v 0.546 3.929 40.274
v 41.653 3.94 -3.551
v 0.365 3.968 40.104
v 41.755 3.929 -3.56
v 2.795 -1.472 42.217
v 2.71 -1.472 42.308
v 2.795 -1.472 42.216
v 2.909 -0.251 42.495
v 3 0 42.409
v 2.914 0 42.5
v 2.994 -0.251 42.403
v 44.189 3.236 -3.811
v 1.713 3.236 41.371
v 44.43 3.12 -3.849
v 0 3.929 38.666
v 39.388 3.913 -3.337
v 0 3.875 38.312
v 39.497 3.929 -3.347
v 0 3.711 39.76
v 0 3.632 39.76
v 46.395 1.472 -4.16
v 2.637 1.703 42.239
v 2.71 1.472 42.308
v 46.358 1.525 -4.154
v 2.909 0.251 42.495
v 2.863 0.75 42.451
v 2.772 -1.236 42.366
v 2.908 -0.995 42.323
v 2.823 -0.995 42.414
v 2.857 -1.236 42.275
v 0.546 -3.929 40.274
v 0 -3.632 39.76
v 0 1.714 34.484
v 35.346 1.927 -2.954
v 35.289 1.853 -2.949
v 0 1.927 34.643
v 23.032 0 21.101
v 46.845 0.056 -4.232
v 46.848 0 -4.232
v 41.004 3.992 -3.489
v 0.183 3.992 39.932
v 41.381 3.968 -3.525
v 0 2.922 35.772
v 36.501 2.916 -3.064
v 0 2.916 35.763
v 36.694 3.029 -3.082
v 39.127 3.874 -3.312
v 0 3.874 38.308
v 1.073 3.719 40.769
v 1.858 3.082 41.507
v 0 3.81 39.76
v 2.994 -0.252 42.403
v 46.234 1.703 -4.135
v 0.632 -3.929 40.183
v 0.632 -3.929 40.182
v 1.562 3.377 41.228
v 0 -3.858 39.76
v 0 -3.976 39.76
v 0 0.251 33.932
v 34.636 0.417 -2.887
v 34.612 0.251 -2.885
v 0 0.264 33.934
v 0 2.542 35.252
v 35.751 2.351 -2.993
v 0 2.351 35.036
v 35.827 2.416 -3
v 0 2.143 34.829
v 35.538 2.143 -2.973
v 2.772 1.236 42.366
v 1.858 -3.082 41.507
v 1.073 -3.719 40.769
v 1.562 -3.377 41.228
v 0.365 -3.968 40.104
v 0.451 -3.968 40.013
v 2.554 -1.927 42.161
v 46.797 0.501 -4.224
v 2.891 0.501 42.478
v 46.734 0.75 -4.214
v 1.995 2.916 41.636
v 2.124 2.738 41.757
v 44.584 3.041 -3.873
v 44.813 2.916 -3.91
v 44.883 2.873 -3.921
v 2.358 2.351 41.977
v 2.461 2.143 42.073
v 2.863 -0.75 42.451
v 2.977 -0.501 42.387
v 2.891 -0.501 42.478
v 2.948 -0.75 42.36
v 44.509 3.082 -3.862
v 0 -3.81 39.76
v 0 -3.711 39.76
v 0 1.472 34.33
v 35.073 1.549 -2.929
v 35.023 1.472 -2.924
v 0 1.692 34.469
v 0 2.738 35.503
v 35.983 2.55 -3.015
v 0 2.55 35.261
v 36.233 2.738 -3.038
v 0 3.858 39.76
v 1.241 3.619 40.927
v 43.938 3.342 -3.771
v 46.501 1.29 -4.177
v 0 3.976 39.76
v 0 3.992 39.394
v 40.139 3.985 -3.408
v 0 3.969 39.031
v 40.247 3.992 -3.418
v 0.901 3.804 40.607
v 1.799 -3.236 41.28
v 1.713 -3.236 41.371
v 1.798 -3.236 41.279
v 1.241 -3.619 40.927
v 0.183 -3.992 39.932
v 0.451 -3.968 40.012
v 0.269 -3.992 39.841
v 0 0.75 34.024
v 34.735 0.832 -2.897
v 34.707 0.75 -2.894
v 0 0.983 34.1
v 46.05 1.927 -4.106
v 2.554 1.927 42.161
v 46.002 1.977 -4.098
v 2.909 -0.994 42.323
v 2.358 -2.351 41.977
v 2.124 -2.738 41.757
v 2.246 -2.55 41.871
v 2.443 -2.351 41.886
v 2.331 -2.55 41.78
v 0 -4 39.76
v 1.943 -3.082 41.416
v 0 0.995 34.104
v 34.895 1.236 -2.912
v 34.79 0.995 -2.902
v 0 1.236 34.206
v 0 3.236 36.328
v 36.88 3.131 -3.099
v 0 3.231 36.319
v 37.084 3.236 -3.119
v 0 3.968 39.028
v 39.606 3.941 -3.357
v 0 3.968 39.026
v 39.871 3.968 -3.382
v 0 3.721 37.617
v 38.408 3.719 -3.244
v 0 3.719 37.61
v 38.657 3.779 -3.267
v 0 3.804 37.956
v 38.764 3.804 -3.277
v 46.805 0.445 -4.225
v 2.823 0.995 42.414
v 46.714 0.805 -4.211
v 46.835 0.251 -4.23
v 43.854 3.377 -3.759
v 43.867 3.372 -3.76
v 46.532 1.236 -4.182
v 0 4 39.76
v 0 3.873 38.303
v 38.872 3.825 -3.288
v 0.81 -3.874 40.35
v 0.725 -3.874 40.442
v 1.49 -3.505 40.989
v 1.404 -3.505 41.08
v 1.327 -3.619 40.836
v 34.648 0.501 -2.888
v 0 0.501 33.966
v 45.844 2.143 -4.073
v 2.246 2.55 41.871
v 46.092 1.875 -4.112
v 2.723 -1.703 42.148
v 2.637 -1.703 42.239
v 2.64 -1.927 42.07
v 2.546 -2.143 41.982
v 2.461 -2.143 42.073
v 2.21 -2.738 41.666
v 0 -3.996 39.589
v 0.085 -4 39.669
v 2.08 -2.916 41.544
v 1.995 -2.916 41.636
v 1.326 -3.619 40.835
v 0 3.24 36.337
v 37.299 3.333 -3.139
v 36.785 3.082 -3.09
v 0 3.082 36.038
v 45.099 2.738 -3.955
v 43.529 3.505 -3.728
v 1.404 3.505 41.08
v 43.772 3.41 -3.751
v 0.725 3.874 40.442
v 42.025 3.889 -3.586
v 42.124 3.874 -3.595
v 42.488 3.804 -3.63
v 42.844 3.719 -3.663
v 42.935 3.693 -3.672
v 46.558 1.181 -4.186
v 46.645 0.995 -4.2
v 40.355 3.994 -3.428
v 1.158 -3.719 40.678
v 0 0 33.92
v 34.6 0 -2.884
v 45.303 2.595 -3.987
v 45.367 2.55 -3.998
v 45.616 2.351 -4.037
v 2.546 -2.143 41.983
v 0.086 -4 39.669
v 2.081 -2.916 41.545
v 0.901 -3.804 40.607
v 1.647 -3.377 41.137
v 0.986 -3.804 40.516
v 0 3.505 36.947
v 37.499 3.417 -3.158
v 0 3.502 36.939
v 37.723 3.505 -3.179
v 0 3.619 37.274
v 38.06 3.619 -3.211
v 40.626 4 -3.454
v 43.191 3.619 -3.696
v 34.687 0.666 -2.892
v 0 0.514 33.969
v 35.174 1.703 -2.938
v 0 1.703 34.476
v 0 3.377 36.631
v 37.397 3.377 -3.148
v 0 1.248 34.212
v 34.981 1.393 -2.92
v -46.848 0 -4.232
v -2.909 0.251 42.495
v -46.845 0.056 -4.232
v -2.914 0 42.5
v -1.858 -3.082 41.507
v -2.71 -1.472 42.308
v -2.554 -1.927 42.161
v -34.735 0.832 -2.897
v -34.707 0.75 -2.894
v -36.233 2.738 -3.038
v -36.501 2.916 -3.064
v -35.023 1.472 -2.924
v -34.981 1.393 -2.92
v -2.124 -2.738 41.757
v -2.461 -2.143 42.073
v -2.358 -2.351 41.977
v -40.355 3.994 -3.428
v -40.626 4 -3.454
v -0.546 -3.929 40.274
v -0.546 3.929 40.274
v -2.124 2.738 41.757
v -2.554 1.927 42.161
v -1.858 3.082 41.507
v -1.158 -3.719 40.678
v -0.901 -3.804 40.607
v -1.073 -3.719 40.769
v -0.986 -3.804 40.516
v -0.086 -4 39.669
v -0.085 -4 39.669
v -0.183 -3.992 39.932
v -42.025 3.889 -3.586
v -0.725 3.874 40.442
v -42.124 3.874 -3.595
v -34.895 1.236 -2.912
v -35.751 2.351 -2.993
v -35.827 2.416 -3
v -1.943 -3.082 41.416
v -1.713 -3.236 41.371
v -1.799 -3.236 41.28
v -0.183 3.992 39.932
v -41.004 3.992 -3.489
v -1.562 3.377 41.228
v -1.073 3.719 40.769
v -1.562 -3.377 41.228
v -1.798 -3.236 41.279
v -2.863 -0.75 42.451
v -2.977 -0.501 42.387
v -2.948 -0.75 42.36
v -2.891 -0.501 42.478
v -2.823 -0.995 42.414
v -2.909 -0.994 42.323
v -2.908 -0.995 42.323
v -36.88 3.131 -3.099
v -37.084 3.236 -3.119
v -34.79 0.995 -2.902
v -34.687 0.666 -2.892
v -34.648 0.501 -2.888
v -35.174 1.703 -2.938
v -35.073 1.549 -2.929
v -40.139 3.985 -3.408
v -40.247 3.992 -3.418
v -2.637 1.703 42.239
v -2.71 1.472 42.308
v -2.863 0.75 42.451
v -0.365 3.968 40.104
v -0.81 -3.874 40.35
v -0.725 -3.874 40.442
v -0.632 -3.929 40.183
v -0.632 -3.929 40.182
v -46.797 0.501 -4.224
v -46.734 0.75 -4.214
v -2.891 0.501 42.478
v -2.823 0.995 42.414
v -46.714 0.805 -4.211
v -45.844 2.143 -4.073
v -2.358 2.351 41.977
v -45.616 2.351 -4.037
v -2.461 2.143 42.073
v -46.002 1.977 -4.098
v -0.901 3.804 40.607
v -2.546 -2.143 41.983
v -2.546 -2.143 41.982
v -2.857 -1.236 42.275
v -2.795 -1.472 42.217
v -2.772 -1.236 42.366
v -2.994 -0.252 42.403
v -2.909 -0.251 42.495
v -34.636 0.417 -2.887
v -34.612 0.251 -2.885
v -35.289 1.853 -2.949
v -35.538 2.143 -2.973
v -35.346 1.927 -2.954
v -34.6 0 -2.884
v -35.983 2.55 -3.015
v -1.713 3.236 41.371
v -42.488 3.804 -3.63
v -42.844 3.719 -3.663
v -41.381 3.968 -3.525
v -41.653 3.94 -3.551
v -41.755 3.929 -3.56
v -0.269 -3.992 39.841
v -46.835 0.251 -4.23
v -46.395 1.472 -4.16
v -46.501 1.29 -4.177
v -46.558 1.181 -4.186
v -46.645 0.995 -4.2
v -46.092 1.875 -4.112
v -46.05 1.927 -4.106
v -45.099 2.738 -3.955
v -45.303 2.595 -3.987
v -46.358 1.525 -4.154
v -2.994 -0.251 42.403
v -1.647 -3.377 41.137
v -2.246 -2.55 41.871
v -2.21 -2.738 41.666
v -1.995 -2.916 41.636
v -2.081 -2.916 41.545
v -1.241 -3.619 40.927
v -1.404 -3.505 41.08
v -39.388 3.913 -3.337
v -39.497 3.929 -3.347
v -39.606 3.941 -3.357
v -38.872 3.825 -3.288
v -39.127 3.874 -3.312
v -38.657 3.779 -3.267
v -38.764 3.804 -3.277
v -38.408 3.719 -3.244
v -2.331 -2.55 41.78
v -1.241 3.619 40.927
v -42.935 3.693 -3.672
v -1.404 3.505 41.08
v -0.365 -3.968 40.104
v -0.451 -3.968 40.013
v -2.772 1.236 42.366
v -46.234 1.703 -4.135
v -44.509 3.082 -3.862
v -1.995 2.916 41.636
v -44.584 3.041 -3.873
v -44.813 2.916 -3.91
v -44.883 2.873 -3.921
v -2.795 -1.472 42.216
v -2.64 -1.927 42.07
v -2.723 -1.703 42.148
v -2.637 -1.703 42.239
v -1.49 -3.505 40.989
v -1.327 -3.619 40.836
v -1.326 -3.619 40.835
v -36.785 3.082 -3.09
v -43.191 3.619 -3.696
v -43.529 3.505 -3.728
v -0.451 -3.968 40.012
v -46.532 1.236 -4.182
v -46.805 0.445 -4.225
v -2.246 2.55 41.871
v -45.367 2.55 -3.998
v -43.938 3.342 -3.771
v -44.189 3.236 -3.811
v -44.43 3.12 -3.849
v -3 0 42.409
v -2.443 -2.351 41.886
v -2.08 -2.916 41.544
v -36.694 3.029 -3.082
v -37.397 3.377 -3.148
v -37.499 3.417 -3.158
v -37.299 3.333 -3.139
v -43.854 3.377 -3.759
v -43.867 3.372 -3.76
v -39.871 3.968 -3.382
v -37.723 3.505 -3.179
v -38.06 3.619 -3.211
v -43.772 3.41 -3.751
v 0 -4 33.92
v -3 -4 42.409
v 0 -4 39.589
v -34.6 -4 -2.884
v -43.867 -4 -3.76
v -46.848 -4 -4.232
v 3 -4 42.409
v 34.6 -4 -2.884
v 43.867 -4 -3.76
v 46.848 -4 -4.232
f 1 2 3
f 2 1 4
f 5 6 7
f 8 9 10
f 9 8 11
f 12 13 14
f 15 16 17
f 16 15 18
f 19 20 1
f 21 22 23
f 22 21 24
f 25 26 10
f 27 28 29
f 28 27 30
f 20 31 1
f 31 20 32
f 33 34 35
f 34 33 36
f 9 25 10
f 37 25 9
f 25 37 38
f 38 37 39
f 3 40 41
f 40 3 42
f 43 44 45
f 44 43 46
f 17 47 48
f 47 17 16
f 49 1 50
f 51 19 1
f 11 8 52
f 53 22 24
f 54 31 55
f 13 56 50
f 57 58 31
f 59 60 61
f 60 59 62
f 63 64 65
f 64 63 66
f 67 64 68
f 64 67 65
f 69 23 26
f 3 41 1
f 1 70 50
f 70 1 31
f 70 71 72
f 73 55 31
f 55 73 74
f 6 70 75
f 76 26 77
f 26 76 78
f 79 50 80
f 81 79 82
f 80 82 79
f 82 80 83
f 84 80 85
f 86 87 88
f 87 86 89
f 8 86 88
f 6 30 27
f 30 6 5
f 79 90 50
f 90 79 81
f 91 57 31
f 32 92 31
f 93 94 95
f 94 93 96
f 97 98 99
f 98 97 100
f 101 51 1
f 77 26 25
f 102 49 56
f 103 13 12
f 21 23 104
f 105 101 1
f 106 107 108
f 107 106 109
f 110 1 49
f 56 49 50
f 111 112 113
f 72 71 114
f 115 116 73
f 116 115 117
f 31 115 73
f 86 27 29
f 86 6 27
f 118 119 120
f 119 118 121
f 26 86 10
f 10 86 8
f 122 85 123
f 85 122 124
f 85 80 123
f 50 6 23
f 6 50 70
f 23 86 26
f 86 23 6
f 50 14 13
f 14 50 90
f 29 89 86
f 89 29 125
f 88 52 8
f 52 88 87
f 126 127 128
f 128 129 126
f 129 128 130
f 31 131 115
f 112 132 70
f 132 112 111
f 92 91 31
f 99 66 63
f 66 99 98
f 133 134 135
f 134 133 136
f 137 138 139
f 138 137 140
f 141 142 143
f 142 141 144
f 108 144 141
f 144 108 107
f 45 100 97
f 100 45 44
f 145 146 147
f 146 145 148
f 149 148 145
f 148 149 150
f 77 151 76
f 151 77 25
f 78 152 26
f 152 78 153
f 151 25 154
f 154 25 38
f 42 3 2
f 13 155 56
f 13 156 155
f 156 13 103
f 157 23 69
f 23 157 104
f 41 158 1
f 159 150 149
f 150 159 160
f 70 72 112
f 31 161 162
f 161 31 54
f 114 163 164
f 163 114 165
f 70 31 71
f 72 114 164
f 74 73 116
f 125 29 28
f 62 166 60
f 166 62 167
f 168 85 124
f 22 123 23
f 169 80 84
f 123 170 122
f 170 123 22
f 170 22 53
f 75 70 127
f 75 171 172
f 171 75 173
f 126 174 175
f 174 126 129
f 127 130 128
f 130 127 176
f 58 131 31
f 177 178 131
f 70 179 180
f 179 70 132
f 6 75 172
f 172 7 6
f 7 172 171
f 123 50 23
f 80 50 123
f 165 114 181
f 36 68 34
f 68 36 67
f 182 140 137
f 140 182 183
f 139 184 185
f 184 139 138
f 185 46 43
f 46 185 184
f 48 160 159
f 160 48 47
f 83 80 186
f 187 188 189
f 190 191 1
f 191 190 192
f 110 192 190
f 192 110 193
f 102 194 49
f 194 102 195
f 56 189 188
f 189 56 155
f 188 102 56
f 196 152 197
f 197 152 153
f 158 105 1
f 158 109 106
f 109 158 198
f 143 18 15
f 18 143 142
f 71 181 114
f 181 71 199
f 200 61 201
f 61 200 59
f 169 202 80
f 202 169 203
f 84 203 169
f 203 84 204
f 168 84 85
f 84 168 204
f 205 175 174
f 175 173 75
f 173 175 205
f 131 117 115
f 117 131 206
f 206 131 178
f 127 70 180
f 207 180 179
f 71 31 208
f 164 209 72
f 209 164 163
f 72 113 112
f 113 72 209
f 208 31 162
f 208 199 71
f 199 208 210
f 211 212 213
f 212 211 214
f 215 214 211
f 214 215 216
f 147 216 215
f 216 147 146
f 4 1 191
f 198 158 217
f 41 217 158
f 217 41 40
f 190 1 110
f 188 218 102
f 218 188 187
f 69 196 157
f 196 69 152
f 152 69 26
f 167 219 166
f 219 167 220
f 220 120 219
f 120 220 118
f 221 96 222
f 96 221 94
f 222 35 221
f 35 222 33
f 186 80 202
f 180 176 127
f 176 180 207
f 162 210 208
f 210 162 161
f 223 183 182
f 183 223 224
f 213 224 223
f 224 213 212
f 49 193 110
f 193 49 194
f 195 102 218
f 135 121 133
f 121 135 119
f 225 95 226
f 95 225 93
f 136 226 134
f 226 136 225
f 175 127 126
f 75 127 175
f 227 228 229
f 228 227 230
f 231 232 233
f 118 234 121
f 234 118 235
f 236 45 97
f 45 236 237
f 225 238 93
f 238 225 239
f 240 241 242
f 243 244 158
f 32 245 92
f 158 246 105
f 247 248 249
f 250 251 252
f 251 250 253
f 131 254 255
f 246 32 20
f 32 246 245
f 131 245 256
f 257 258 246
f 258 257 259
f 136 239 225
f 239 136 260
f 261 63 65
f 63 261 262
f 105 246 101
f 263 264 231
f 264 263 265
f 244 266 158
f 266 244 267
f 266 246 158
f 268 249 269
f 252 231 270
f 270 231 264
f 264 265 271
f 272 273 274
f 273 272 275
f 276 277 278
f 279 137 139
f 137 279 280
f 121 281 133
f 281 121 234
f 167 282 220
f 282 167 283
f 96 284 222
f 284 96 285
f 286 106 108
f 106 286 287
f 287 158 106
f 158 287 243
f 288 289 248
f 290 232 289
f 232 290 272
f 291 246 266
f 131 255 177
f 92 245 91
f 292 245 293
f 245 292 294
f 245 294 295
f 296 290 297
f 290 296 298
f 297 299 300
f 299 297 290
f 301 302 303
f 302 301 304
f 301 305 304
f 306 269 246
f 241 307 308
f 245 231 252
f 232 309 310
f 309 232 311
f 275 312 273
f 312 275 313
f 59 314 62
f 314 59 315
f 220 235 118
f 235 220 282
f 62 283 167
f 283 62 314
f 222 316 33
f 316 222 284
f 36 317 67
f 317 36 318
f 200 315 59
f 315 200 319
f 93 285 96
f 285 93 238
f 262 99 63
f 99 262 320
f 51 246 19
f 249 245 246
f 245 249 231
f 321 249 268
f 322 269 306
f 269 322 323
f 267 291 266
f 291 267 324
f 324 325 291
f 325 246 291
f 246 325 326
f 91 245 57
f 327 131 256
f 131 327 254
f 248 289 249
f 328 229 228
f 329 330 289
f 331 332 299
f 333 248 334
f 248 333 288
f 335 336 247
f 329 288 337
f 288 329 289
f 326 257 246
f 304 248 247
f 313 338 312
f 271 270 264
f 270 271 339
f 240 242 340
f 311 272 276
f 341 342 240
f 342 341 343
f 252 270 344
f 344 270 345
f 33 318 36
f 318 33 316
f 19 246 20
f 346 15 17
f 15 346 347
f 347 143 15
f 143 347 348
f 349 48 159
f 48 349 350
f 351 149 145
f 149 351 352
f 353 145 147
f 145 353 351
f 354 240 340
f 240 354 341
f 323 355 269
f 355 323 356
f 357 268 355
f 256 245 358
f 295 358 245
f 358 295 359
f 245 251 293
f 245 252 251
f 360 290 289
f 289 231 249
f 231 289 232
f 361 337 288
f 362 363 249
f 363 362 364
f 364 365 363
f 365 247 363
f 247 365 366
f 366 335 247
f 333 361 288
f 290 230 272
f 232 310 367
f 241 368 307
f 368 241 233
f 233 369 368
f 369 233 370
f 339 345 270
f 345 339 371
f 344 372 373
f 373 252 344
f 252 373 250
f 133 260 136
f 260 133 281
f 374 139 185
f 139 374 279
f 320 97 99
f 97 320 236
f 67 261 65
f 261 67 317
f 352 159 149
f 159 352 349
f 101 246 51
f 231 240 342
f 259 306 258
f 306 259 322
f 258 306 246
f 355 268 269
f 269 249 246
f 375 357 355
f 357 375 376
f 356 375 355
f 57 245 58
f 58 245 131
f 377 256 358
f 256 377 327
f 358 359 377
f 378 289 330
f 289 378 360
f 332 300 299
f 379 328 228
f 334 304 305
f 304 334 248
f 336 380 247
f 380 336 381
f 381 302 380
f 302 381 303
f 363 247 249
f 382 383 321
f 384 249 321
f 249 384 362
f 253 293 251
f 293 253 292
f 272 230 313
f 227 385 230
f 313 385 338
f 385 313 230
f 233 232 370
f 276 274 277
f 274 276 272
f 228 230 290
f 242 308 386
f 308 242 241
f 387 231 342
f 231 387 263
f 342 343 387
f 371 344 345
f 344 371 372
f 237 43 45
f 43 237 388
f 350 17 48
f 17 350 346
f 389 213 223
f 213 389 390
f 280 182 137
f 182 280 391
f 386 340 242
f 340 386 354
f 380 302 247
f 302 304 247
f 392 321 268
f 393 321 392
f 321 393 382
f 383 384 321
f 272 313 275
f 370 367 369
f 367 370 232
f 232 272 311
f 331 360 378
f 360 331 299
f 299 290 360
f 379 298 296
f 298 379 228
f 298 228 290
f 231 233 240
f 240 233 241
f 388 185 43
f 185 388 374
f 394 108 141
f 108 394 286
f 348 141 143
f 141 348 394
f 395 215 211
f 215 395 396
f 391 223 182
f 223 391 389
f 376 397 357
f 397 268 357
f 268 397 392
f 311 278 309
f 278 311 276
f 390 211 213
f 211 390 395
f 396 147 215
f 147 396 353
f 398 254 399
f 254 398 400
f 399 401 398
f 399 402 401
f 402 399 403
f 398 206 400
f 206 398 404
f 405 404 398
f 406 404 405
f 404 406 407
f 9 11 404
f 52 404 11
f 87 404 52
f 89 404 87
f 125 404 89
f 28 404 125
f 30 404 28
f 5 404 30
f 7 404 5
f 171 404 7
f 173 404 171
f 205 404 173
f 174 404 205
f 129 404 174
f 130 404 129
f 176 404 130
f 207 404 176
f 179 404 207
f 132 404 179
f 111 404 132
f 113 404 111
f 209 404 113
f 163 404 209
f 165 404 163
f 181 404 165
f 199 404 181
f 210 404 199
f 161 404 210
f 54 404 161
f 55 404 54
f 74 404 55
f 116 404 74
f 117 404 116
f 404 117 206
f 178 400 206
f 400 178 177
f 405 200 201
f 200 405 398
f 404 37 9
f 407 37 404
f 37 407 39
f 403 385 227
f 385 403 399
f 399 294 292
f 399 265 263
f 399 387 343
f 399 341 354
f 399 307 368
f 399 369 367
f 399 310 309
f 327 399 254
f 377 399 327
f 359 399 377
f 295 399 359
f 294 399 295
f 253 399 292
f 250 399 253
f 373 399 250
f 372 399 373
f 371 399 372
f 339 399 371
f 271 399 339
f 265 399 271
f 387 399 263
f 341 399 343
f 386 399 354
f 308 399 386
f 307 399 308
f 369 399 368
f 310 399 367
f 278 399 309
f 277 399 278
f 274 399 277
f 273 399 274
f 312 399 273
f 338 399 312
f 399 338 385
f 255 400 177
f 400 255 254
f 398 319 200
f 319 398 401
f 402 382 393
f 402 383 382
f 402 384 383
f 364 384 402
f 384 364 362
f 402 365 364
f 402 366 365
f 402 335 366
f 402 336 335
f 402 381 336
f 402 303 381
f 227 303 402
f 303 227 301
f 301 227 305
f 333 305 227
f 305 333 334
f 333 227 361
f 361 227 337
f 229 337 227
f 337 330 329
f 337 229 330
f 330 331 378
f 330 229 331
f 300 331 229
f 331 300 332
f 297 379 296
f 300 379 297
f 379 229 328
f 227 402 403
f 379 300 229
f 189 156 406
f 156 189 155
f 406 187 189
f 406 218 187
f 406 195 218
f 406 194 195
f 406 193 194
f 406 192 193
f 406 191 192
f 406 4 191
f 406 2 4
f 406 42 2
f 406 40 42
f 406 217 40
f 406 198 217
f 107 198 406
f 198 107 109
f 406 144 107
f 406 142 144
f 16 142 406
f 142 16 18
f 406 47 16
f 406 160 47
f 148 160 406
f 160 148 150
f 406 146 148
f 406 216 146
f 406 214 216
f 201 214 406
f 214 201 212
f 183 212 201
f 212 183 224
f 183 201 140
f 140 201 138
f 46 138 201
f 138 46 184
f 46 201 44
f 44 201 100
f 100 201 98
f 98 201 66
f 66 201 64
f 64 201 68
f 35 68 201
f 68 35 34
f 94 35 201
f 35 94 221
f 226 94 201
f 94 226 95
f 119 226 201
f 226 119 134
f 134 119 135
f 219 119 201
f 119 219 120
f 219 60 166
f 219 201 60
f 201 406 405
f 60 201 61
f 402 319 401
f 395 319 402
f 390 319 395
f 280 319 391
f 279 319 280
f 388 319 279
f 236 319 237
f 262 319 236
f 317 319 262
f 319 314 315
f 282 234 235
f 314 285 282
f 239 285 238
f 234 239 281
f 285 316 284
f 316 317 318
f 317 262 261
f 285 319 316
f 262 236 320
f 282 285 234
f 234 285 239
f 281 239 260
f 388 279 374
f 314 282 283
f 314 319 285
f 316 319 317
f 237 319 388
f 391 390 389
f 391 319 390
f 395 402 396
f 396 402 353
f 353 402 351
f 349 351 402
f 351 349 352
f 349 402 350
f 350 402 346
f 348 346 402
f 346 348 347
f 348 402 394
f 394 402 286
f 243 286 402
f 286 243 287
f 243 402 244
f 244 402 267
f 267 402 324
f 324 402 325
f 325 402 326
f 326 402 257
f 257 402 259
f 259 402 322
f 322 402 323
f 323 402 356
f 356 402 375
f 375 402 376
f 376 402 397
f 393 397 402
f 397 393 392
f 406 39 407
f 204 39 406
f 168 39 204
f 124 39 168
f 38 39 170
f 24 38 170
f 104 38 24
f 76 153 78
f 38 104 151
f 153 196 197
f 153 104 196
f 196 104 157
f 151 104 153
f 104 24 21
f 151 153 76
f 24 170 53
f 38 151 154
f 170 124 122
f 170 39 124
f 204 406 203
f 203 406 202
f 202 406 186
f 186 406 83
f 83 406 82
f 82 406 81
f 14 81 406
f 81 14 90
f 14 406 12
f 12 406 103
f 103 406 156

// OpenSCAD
// file: general-functions.scad
//openscad settings
$fn=100;

// M
// Measurements of the Kopter(mm):
// M
//radius of the balloon
outer_radius = 700/2;
//thickness of carbon ring
thickness = 1;
//height of the carbon ring (= width of carbon band)
height = 10;  // 0.94 measured
//rotor radius
rotor = 41;

// motor holder parameters

//M
//motor measurements
//M
motor_height = 5.5;
motor_radius = 5 * 0.32;
motor_drill = 2.5;
motor_wires = 4.5;
wire_cutout = motor_height - motor_drill;

// P
//parameters for motor ring
// P
ring_thickness = 3;
//angle covered by one motor holder
angle= 15;
//factor for increasing thickness of rail
rail_strength = 1;
//radius of arms holding motors
arm_strength = 4;
//distance for rotors needs to include motor_radius and ring_thickness
//to make sure the motor ring is where the arms meet
rotor_r = rotor + motor_radius + ring_thickness;

// C
// calculation of lengths, angles for motor arms
// C
betta = 90 - angle/2;   			//angle = alpha
be = cos(betta) * outer_radius;	//outer_radius = r_Kopter
fe = outer_radius * (1 -cos(angle/2));
ce = rotor_r + fe; //
bc = sqrt(ce*ce + be*be);
gamma = atan(be/ce);
length = bc + 4*arm_strength;  
//add arm_strength so arms completely intercect with large circle
delta_h= arm_strength/(sin(gamma)); 


//M
//Screw Measurements
//M
//M2 screw, for better hold decrease slightly
screw_diameter = 2;
//smalles diameter of nut
nut = 4;


//from: http://www.thingiverse.com/thing:34027
module pie_slice(radius, angle, step) {
for(theta = [0:step:angle-step]) {
rotate([0,0,0]) linear_extrude(height = radius*2, center=true)
polygon( points = [[0,0],[radius * cos(theta+step) ,radius * sin(theta+step)],[radius*cos(theta),radius*sin(theta)]]);
}}

//from: http://www.thingiverse.com/thing:34027
module partial_rotate_extrude(angle, radius, convex) {
intersection () {
rotate_extrude(convexity=convex) translate([radius,0,0]) child(0);
pie_slice(radius*2, angle, angle/5);
}} 
// main file
include <general-functions.scad>;

module motor_arm(rotor_r, outer_radius, fe, gamma, length, arm_strength)
//add motor arms to circle at given radius
//circle goes through (0,0,0)
//angle between arms is calculated so they mark the area of the circle,
//given by the angle in the variables
{
	difference()
	{
		translate([0,0,rotor_r])
		rotate([180,0,0])
 		v_arms(delta_h, gamma, length, arm_strength);
		rotate([90,0,0])
		translate([0, -outer_radius-1, -30])
		//translate a bit further to make sure part connects well with other parts
		cylinder(h = 60, r= outer_radius);
	}
}


module v_arms_round(delta_h, gamma, length, arm_strength)
//construct round part of motor arms with correct angles, lenths
{

 	translate([0, 0, delta_h])
	rotate ([0,gamma,0])
	cylinder(h = length, r= arm_strength);

	translate([0, 0, delta_h])
	rotate ([0,-gamma,0])
	cylinder(h = length, r= arm_strength);
}

module v_arms_square(delta_h, gamma, length, arm_strength)

//construct square part of motor arms with correct angles, lenths
{

	rotate ([0,gamma,0])
 	translate([-2*arm_strength, 0, 0.75*delta_h])  //factor 0.75 is jsut an estimate...
	linear_extrude(height = length, center = false, convexity = 10, twist = 0)
	square([2* arm_strength, arm_strength]);

	rotate ([0,-gamma,0])
	translate([0, 0, 0.75*delta_h])   //factor 0.75 is jsut an estimate...
	linear_extrude(height = length, center = false, convexity = 10, twist = 0)
	square([2* arm_strength, arm_strength]);
}


module v_arms(delta_h, gamma, length, arm_strength)
//put round and square arms together
{
	union()
	{
		v_arms_round(delta_h, gamma, length, arm_strength);
		v_arms_square(delta_h, gamma, length, arm_strength);
	}
}

motor_arm(rotor_r, outer_radius, fe, gamma, length, arm_strength);
